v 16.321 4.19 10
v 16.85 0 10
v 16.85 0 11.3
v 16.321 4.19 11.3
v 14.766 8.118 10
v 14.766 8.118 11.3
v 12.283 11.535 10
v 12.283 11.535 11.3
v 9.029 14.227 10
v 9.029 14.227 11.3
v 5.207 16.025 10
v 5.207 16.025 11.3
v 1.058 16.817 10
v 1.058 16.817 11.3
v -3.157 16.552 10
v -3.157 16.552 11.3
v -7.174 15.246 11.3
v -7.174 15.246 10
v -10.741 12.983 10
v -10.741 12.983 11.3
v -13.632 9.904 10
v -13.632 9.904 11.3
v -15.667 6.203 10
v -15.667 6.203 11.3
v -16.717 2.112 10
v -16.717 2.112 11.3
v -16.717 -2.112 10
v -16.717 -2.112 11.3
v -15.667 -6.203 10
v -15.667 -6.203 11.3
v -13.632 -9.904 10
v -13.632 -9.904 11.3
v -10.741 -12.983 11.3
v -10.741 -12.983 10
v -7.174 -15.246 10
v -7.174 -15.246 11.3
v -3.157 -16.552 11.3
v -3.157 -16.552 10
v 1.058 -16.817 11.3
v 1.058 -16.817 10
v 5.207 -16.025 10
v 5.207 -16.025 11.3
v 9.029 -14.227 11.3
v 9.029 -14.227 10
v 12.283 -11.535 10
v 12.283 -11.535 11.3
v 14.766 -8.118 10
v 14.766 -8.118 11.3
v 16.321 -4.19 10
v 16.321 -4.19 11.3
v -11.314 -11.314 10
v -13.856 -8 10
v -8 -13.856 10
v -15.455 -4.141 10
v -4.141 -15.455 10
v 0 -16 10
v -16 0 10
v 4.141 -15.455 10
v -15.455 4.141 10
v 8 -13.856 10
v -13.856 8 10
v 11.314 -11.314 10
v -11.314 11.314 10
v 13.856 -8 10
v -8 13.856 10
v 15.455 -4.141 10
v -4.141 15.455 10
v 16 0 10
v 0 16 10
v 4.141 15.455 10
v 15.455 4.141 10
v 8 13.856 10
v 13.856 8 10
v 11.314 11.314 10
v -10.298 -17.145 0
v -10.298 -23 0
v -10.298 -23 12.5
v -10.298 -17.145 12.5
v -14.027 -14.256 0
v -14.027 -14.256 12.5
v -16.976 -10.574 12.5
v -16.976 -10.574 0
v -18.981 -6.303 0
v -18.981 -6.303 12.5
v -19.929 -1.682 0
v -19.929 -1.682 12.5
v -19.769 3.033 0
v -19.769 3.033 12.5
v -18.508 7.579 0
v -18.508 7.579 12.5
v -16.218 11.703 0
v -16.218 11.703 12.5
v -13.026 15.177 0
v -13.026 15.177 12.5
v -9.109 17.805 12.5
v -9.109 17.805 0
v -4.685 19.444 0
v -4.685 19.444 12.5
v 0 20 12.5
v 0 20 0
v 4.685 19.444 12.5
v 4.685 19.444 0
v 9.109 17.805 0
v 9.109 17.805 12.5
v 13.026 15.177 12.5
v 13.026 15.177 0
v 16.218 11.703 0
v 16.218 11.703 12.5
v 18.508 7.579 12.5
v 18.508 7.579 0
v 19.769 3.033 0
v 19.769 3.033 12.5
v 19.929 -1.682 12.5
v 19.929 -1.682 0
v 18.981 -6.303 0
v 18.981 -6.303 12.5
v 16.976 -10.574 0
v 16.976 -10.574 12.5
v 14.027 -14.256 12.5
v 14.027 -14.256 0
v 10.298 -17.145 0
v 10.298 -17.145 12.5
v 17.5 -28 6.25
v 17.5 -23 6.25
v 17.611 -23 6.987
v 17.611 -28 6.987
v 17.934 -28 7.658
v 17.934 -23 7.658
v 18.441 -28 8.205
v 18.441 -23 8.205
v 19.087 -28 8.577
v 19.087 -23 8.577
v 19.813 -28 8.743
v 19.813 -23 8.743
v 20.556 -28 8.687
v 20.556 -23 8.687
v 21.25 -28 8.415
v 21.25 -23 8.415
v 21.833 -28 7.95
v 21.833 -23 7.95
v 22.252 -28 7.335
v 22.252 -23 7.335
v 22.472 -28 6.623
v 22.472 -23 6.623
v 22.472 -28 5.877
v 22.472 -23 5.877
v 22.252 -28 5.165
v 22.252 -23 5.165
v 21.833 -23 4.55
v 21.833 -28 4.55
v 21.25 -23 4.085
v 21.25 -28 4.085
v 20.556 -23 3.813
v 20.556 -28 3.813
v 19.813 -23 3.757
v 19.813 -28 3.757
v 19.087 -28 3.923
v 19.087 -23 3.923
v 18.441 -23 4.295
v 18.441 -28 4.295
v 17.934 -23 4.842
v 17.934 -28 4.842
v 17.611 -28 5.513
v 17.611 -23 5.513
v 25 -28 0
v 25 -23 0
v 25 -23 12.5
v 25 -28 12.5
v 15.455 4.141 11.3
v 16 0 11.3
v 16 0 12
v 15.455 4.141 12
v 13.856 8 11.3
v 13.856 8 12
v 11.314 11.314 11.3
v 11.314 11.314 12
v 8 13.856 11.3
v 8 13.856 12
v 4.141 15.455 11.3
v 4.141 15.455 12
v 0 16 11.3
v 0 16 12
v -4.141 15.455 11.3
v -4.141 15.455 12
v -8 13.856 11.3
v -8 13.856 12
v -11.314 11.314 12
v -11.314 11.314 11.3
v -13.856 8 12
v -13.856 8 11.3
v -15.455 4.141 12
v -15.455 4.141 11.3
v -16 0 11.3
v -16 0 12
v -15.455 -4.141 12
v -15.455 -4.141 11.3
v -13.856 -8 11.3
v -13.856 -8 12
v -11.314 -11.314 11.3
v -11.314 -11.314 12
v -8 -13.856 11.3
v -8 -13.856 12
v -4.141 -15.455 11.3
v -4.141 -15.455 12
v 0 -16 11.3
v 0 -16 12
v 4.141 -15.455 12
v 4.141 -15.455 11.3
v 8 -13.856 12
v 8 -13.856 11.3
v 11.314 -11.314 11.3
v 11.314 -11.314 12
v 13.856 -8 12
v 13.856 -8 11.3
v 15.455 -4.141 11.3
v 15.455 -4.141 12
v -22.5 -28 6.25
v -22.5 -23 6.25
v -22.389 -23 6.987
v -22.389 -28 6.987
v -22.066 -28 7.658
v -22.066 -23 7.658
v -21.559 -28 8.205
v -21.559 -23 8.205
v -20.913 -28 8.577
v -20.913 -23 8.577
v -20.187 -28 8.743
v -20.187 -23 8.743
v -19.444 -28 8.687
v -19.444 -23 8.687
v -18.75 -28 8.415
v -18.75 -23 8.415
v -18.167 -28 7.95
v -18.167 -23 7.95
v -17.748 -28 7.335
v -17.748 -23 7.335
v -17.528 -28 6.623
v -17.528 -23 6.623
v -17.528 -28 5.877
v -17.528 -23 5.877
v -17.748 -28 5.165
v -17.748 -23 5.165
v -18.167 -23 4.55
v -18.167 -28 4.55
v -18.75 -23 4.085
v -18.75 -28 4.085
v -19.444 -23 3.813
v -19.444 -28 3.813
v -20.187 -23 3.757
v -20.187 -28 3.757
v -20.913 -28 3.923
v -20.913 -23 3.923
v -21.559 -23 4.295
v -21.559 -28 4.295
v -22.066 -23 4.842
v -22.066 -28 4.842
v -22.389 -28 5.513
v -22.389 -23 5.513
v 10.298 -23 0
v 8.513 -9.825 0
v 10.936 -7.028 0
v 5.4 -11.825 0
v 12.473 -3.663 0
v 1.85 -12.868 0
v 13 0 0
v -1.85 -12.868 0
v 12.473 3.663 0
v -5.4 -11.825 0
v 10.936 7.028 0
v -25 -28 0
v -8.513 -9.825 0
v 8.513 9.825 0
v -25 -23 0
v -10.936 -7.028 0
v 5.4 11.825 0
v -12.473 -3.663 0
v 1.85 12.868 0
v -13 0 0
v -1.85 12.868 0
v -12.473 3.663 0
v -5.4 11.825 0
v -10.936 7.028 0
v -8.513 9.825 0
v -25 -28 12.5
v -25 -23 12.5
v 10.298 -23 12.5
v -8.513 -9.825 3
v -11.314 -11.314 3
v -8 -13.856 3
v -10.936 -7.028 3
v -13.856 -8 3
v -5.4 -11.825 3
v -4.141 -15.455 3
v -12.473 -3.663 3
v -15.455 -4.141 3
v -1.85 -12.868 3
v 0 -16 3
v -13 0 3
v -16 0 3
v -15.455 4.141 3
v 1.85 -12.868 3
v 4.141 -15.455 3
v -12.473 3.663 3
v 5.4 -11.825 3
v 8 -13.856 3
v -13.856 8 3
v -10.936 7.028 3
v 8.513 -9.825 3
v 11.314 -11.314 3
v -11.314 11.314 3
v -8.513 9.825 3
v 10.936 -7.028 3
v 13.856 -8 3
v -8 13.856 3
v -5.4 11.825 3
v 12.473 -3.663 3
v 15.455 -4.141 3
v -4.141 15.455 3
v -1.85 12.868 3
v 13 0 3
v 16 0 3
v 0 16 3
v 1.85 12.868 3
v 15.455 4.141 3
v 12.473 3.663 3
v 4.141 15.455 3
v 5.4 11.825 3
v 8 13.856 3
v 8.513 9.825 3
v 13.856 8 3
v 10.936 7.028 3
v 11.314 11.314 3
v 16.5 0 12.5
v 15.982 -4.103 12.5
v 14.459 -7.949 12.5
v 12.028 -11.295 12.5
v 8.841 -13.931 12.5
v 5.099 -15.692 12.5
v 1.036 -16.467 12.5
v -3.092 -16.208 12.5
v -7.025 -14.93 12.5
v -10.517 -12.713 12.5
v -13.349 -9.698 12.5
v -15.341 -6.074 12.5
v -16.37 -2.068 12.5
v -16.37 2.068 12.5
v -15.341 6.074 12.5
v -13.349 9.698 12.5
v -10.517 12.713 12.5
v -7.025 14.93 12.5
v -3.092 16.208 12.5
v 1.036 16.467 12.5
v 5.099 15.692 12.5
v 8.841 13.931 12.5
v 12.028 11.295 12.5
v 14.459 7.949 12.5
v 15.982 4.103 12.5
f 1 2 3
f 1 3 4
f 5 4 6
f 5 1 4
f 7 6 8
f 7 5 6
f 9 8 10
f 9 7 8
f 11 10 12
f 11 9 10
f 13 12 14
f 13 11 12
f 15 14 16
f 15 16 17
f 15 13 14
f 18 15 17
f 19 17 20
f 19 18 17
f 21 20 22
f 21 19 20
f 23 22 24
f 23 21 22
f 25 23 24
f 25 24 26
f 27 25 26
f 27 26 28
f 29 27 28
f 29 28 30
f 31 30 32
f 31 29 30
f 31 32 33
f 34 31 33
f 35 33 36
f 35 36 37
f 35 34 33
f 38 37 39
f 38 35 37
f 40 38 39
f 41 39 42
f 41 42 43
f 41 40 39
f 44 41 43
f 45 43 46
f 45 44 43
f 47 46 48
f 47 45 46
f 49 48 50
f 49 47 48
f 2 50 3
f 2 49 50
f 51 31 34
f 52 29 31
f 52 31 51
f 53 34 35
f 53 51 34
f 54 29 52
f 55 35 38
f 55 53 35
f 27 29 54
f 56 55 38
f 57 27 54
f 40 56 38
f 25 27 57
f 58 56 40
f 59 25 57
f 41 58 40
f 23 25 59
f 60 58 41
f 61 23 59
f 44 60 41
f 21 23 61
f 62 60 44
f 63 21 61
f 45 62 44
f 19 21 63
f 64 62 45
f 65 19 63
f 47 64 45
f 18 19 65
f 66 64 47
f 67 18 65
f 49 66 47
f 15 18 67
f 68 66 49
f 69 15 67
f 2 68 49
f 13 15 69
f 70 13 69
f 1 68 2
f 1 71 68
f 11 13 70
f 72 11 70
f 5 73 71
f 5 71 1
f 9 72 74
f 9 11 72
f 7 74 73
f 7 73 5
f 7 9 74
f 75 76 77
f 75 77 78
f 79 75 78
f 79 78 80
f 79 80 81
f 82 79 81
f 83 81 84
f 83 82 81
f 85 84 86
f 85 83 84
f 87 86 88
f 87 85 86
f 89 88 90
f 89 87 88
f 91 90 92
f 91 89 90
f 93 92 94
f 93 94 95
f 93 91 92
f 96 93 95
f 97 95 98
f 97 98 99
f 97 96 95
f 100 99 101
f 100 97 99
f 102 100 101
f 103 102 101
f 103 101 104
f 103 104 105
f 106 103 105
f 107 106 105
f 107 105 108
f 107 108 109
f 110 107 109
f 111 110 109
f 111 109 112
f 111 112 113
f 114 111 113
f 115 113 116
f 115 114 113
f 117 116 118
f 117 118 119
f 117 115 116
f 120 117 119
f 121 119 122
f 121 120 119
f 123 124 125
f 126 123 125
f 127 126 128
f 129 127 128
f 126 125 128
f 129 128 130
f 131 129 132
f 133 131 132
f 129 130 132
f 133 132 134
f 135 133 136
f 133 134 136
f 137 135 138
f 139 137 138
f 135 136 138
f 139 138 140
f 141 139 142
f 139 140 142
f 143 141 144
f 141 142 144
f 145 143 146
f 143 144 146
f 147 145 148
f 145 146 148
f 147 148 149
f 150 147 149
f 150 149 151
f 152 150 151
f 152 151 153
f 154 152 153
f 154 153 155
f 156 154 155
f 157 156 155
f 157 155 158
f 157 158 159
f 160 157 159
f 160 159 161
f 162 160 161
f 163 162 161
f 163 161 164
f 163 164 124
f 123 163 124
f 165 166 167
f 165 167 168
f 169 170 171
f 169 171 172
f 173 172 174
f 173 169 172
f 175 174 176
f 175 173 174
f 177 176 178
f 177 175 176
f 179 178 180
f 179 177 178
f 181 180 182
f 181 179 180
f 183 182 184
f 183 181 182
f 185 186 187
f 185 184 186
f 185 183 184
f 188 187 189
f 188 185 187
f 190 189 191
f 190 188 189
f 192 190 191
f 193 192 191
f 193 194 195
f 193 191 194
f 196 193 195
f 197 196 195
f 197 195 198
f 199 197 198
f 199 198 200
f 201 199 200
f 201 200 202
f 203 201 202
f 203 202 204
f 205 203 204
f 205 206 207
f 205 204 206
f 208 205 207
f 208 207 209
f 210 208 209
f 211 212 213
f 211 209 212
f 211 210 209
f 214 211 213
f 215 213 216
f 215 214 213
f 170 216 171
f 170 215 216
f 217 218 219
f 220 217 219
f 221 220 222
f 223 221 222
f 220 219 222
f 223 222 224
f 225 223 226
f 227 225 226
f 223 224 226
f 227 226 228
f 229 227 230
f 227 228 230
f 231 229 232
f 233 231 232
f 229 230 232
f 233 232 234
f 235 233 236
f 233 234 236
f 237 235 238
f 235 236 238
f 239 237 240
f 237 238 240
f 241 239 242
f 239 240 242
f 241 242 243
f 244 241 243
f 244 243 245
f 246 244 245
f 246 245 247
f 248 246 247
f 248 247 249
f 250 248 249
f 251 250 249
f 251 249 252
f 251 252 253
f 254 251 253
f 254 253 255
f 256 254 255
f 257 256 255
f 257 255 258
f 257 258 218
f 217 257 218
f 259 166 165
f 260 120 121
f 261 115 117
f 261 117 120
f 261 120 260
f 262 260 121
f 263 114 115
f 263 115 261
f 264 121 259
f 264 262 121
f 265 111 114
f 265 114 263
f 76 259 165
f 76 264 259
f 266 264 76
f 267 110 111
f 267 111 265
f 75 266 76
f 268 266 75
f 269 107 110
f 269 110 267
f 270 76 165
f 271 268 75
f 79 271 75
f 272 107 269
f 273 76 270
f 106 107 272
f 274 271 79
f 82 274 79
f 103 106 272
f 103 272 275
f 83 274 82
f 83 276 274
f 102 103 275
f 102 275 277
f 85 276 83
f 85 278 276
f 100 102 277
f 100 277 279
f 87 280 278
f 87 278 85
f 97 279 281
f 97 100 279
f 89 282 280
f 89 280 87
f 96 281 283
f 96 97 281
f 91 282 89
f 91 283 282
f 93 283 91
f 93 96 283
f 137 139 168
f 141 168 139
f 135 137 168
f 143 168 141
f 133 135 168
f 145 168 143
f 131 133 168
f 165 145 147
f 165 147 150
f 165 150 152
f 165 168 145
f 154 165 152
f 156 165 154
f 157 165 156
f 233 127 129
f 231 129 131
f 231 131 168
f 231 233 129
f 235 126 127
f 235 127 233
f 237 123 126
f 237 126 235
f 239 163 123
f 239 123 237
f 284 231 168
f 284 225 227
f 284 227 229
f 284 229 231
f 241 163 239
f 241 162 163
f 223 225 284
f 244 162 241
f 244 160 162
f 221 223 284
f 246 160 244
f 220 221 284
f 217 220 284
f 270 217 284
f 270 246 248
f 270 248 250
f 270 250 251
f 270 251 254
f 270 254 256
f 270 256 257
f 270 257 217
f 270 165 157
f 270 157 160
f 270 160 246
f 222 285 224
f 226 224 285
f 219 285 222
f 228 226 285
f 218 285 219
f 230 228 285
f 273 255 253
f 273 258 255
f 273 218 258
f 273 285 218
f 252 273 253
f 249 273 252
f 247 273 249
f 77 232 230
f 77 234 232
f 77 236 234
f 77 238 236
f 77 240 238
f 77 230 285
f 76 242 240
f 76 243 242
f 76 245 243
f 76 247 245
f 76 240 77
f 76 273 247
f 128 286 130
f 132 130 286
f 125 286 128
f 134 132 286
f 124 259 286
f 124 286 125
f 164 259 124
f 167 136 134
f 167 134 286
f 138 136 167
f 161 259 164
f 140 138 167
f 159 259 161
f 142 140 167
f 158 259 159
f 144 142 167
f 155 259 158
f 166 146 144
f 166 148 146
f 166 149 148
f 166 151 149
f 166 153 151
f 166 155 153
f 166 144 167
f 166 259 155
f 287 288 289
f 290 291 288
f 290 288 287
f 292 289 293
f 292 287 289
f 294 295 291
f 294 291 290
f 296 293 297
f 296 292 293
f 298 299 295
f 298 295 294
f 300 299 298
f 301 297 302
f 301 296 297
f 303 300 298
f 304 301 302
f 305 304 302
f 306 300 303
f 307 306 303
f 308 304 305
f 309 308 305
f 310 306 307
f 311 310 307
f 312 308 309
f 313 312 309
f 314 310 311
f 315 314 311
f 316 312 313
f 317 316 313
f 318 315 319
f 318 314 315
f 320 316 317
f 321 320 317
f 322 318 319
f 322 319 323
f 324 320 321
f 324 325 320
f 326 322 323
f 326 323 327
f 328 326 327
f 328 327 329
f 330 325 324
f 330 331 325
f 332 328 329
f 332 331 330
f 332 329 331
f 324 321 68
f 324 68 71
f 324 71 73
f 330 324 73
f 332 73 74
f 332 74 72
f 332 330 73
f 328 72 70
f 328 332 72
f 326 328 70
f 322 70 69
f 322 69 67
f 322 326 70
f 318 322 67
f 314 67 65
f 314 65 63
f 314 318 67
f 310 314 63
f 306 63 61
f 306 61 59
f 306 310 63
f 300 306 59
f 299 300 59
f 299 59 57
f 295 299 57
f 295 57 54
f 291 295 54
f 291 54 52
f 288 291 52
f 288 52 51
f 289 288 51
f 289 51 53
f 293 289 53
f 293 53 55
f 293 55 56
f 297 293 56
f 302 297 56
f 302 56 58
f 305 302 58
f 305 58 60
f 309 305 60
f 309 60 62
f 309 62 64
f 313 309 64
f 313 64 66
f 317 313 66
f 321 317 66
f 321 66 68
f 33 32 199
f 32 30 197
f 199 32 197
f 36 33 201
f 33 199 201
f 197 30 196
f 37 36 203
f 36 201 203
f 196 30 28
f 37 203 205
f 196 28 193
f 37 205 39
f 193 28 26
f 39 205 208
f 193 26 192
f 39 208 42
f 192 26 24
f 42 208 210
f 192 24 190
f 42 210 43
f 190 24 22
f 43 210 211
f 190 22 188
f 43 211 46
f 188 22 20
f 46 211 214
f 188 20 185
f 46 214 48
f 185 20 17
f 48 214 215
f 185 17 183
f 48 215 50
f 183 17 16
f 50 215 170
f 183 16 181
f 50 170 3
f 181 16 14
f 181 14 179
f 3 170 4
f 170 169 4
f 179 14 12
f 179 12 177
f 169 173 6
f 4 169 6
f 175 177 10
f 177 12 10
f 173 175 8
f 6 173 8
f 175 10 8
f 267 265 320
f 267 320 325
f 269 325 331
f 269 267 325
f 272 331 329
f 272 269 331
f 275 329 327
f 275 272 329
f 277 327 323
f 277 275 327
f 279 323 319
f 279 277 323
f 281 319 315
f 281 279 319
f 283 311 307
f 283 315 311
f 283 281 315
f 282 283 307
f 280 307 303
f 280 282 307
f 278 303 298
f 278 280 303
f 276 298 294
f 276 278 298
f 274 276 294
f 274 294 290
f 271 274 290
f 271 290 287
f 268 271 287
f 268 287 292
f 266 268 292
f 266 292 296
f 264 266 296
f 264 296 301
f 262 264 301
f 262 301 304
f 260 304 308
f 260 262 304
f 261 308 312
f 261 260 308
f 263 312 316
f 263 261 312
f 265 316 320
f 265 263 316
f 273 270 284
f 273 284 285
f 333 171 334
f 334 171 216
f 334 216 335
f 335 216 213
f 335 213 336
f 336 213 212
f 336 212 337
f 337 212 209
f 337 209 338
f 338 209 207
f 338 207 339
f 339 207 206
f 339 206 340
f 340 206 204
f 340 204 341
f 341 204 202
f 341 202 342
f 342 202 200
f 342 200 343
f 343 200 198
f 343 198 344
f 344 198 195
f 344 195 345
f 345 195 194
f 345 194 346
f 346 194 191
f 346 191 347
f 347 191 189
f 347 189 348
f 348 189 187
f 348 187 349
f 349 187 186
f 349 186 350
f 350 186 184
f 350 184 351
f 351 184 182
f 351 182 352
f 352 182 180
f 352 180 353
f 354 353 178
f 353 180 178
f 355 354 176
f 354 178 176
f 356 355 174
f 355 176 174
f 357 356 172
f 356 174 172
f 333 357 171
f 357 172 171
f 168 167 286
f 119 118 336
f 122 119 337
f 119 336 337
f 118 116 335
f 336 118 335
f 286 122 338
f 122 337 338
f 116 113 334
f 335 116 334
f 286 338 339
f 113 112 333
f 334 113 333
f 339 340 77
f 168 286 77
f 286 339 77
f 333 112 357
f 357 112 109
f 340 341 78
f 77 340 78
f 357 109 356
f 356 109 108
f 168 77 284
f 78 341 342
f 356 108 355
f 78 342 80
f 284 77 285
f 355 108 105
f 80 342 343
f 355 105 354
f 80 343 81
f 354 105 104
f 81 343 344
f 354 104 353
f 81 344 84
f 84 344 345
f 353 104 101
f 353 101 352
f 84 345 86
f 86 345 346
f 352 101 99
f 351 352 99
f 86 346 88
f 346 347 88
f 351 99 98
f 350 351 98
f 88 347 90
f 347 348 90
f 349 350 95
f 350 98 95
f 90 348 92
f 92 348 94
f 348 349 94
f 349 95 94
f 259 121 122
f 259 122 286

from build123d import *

# Parameters (mm, degrees)
SKETCH1_R           = 13
BOSS_EXTRUDE1_DEPTH = 12.5
CUT_EXTRUDE1_START  = 3
SKETCH2_R           = 16
CUT_EXTRUDE1_DEPTH  = 37.563240514
SKETCH3_R           = 2.5
CUT_EXTRUDE2_DEPTH  = 52.285962992
CUT_EXTRUDE3_START  = 10
SKETCH5_R           = 16.85
SKETCH5_R_2         = 16
CUT_EXTRUDE3_DEPTH  = 1.3
CHAMFER2_SIZE       = 0.5


with BuildPart() as part:
    # Sketch1 → Boss-Extrude1 (new body)
    with BuildSketch(Plane.XY):
        with BuildLine():
            Line((25, -28), (-25, -28))
            Line((-25, -28), (-25, -23))
            Line((-25, -23), (-10.297842021, -23))
            Line((-10.297842021, -23), (-10.297842021, -17.145099875))
            ThreePointArc((-10.297842021, -17.145099875), (0, 20), (10.297842021, -17.145099875))
            Line((10.297842021, -17.145099875), (10.297842021, -23))
            Line((10.297842021, -23), (25, -23))
            Line((25, -23), (25, -28))
        make_face()
        Circle(SKETCH1_R, mode=Mode.SUBTRACT)
    extrude(amount=BOSS_EXTRUDE1_DEPTH)

    # Sketch2 → Cut-Extrude1 (cut, through all)
    with BuildSketch(Plane.XY.offset(CUT_EXTRUDE1_START)):
        Circle(SKETCH2_R)
    extrude(amount=CUT_EXTRUDE1_DEPTH, mode=Mode.SUBTRACT)

    # Sketch3 → Cut-Extrude2 (cut, through all)
    with BuildSketch(Plane(origin=(0, -23, 0), x_dir=(1, 0, 0), z_dir=(0, 1, 0))):
        with Locations(Location((-20, -6.25, 0), (0, 0, 180))):
            Circle(SKETCH3_R)
        with Locations(Location((20, -6.25, 0), (0, 0, 180))):
            Circle(SKETCH3_R)
    extrude(amount=-CUT_EXTRUDE2_DEPTH, mode=Mode.SUBTRACT)

    # Sketch5 → Cut-Extrude3 (cut)
    with BuildSketch(Plane.XY.offset(CUT_EXTRUDE3_START)):
        Circle(SKETCH5_R)
        Circle(SKETCH5_R_2, mode=Mode.SUBTRACT)
    extrude(amount=CUT_EXTRUDE3_DEPTH, mode=Mode.SUBTRACT)

    # Chamfer2
    chamfer2_edges = [part.edges().sort_by_distance(p)[0] for p in [
        (-16, 0, 12.5),
    ]]
    chamfer(chamfer2_edges, length=CHAMFER2_SIZE)


solid = part.part
